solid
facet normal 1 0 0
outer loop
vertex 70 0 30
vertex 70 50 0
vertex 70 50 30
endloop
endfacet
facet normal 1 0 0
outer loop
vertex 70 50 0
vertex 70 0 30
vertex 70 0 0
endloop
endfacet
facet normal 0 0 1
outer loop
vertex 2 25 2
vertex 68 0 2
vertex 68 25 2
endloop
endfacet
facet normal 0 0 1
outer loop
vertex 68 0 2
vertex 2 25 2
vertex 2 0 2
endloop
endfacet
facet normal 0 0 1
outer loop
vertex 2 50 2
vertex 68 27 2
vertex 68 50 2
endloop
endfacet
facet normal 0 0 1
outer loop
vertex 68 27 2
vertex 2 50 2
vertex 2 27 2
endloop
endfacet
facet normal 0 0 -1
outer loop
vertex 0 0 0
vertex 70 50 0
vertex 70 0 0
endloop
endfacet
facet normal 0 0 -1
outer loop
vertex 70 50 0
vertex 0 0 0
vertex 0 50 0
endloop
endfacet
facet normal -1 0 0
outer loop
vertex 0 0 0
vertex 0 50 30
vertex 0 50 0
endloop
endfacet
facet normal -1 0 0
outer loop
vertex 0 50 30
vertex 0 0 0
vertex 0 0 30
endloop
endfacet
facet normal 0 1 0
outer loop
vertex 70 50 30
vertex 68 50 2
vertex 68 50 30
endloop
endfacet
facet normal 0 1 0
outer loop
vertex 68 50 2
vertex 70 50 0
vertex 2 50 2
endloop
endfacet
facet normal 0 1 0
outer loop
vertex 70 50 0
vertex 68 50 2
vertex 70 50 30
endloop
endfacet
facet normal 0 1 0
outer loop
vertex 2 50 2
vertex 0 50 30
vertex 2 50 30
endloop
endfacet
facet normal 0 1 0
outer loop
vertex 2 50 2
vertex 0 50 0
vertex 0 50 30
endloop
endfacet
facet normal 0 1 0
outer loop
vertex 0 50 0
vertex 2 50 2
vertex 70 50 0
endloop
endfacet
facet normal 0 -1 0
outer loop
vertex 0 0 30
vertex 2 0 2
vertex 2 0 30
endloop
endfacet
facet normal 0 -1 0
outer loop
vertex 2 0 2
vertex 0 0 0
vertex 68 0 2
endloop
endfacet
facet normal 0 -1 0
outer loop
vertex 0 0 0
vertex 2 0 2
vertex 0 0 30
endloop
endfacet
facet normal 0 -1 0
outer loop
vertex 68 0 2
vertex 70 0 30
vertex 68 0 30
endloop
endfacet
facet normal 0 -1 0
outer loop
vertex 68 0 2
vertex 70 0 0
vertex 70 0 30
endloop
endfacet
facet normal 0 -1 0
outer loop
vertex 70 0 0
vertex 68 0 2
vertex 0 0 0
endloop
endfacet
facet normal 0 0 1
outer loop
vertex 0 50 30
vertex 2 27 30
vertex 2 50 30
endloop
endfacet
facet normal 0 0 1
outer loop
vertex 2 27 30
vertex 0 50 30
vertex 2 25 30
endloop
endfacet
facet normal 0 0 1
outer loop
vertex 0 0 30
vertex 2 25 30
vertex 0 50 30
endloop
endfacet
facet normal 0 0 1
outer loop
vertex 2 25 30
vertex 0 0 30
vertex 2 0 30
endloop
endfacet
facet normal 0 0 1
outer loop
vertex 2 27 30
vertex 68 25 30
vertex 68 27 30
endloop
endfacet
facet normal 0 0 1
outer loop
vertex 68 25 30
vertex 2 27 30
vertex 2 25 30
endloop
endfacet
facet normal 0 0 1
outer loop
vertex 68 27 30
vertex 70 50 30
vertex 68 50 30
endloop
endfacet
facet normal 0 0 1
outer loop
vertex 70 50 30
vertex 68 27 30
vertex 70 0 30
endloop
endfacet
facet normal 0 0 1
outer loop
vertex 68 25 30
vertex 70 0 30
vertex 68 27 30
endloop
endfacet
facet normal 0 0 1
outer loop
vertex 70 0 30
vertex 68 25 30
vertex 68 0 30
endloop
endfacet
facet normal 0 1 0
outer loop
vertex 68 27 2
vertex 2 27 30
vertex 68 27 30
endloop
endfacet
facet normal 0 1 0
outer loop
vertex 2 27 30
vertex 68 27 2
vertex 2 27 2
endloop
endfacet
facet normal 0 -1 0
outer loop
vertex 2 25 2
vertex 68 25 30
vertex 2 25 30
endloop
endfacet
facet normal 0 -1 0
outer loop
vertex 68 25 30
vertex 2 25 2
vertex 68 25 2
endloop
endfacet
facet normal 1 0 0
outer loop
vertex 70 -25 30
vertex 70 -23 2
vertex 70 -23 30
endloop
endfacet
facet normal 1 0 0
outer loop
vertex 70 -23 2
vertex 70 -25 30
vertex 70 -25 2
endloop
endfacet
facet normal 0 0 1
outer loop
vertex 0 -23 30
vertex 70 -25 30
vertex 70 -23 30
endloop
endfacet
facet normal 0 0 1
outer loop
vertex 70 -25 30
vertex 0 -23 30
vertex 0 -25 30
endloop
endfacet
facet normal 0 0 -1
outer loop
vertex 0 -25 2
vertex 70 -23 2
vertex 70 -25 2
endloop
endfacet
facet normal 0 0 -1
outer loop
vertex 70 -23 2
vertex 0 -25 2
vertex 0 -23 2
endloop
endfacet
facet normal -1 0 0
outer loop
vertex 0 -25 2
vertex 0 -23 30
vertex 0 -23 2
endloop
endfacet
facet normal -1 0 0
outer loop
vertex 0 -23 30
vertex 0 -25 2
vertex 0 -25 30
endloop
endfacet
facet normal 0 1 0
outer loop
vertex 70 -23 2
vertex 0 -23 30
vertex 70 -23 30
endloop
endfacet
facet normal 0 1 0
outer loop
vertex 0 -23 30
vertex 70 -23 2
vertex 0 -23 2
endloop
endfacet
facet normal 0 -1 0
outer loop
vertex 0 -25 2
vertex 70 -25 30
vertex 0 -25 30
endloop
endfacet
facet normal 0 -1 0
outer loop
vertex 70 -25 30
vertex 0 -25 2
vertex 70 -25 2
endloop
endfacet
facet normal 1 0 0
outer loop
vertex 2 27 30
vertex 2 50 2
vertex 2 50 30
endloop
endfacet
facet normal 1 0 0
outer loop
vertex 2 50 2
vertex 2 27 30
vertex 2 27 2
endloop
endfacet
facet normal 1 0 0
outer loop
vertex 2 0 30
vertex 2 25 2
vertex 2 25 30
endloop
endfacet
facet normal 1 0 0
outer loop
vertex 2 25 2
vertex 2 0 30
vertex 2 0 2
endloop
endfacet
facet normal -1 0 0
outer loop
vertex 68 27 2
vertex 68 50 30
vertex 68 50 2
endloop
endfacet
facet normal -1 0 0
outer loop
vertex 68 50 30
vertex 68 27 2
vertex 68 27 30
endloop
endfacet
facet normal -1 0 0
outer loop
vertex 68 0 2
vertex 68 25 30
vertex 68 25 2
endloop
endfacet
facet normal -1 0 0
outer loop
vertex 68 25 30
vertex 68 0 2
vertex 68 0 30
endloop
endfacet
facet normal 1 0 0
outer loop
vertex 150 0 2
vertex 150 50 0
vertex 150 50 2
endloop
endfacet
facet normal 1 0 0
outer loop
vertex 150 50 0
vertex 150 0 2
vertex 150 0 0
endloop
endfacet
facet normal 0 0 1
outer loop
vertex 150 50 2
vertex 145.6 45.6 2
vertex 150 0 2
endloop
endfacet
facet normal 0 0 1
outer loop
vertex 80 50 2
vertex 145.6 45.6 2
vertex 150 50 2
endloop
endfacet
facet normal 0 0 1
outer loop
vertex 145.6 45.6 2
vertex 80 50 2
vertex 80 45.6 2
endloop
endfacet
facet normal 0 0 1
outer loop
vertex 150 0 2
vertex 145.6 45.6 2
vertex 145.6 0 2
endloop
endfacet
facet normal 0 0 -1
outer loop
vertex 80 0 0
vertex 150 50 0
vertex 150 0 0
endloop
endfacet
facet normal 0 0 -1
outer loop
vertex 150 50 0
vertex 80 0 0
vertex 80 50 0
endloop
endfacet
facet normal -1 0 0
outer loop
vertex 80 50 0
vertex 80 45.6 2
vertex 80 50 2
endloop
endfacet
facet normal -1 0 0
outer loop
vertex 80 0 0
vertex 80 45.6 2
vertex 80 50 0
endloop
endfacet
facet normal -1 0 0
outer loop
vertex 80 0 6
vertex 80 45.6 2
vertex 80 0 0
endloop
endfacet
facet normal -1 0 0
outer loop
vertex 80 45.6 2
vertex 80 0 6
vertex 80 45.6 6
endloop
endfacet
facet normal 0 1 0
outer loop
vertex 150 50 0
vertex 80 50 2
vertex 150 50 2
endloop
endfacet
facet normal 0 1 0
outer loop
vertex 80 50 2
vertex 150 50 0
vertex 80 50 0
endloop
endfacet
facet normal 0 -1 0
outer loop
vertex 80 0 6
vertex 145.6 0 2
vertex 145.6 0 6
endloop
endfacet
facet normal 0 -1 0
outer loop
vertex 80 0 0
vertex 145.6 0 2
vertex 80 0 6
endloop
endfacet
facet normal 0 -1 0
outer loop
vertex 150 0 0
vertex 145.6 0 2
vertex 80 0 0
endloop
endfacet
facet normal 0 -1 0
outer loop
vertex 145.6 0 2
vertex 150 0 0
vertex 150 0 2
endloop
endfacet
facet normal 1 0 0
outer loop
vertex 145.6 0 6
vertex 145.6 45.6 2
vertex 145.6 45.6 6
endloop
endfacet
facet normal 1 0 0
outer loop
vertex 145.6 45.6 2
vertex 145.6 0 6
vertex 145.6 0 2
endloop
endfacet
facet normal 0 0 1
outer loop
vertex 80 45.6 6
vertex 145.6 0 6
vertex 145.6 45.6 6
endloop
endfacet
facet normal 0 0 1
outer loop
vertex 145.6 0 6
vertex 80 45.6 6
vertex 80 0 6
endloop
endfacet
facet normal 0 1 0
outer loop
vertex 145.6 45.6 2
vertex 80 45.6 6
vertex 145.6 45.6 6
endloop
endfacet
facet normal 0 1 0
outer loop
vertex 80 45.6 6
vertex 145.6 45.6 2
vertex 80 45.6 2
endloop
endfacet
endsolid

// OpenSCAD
// Part 1: The Box
// Dimensions: 70 x 50 x 30 mm (X x Y x Z)
// Wall thickness: 2 mm
// Floor thickness: 2 mm
// Open top
box_x = 70;
box_y = 50;
box_z = 30;
wall_thick = 2;
floor_thick = 2;

// Part 2: The Lid
// Dimensions: 70 x 50 x 2 mm (Plate)
// Lip dimensions: 1.5 mm thick, 4 mm tall
// Outer lip size: 65.6 x 45.6 mm
// Clearance: 0.2 mm on each side
lid_x = 70;
lid_y = 50;
lid_z = 2;
lip_thick = 1.5;
lip_h = 4;
lip_outer_x = 65.6;
lip_outer_y = 45.6;
clearance = 0.2;

// Gap between parts
gap = 10;

// Calculate inner box dimensions
inner_box_x = box_x - (2 * wall_thick);
inner_box_y = box_y - (2 * wall_thick);
inner_box_z = box_z - floor_thick;

// Calculate lip inner dimensions
lip_inner_x = lip_outer_x - (2 * lip_thick);
lip_inner_y = lip_outer_y - (2 * lip_thick);

// Calculate lid position offset
lid_offset = box_x + gap;

// --- Part 1: The Box ---
module box_part() {
    union() {
        // Floor
        translate([0, 0, 0])
            cube([box_x, box_y, floor_thick]);
        
        // Walls
        // Front Wall
        translate([0, box_y / 2, floor_thick])
            cube([box_x, wall_thick, box_z - floor_thick]);
        // Back Wall
        translate([0, -box_y / 2, floor_thick])
            cube([box_x, wall_thick, box_z - floor_thick]);
        // Left Wall
        translate([0, 0, floor_thick])
            cube([wall_thick, box_y, box_z - floor_thick]);
        // Right Wall
        translate([box_x - wall_thick, 0, floor_thick])
            cube([wall_thick, box_y, box_z - floor_thick]);
    }
}

// --- Part 2: The Lid (Printed Upside Down) ---
module lid_part() {
    union() {
        // Main Plate
        translate([lid_offset, 0, 0])
            cube([lid_x, lid_y, lid_z]);
        
        // Lip (Raised on top)
        // The lip is 1.5mm thick, 4mm tall.
        // It sits on top of the 2mm plate, so its bottom is at z = 2mm.
        translate([lid_offset, 0, lid_z])
            cube([lip_outer_x, lip_outer_y, lip_h]);
    }
}

// --- Assembly ---
// Render both parts
box_part();
lid_part();
